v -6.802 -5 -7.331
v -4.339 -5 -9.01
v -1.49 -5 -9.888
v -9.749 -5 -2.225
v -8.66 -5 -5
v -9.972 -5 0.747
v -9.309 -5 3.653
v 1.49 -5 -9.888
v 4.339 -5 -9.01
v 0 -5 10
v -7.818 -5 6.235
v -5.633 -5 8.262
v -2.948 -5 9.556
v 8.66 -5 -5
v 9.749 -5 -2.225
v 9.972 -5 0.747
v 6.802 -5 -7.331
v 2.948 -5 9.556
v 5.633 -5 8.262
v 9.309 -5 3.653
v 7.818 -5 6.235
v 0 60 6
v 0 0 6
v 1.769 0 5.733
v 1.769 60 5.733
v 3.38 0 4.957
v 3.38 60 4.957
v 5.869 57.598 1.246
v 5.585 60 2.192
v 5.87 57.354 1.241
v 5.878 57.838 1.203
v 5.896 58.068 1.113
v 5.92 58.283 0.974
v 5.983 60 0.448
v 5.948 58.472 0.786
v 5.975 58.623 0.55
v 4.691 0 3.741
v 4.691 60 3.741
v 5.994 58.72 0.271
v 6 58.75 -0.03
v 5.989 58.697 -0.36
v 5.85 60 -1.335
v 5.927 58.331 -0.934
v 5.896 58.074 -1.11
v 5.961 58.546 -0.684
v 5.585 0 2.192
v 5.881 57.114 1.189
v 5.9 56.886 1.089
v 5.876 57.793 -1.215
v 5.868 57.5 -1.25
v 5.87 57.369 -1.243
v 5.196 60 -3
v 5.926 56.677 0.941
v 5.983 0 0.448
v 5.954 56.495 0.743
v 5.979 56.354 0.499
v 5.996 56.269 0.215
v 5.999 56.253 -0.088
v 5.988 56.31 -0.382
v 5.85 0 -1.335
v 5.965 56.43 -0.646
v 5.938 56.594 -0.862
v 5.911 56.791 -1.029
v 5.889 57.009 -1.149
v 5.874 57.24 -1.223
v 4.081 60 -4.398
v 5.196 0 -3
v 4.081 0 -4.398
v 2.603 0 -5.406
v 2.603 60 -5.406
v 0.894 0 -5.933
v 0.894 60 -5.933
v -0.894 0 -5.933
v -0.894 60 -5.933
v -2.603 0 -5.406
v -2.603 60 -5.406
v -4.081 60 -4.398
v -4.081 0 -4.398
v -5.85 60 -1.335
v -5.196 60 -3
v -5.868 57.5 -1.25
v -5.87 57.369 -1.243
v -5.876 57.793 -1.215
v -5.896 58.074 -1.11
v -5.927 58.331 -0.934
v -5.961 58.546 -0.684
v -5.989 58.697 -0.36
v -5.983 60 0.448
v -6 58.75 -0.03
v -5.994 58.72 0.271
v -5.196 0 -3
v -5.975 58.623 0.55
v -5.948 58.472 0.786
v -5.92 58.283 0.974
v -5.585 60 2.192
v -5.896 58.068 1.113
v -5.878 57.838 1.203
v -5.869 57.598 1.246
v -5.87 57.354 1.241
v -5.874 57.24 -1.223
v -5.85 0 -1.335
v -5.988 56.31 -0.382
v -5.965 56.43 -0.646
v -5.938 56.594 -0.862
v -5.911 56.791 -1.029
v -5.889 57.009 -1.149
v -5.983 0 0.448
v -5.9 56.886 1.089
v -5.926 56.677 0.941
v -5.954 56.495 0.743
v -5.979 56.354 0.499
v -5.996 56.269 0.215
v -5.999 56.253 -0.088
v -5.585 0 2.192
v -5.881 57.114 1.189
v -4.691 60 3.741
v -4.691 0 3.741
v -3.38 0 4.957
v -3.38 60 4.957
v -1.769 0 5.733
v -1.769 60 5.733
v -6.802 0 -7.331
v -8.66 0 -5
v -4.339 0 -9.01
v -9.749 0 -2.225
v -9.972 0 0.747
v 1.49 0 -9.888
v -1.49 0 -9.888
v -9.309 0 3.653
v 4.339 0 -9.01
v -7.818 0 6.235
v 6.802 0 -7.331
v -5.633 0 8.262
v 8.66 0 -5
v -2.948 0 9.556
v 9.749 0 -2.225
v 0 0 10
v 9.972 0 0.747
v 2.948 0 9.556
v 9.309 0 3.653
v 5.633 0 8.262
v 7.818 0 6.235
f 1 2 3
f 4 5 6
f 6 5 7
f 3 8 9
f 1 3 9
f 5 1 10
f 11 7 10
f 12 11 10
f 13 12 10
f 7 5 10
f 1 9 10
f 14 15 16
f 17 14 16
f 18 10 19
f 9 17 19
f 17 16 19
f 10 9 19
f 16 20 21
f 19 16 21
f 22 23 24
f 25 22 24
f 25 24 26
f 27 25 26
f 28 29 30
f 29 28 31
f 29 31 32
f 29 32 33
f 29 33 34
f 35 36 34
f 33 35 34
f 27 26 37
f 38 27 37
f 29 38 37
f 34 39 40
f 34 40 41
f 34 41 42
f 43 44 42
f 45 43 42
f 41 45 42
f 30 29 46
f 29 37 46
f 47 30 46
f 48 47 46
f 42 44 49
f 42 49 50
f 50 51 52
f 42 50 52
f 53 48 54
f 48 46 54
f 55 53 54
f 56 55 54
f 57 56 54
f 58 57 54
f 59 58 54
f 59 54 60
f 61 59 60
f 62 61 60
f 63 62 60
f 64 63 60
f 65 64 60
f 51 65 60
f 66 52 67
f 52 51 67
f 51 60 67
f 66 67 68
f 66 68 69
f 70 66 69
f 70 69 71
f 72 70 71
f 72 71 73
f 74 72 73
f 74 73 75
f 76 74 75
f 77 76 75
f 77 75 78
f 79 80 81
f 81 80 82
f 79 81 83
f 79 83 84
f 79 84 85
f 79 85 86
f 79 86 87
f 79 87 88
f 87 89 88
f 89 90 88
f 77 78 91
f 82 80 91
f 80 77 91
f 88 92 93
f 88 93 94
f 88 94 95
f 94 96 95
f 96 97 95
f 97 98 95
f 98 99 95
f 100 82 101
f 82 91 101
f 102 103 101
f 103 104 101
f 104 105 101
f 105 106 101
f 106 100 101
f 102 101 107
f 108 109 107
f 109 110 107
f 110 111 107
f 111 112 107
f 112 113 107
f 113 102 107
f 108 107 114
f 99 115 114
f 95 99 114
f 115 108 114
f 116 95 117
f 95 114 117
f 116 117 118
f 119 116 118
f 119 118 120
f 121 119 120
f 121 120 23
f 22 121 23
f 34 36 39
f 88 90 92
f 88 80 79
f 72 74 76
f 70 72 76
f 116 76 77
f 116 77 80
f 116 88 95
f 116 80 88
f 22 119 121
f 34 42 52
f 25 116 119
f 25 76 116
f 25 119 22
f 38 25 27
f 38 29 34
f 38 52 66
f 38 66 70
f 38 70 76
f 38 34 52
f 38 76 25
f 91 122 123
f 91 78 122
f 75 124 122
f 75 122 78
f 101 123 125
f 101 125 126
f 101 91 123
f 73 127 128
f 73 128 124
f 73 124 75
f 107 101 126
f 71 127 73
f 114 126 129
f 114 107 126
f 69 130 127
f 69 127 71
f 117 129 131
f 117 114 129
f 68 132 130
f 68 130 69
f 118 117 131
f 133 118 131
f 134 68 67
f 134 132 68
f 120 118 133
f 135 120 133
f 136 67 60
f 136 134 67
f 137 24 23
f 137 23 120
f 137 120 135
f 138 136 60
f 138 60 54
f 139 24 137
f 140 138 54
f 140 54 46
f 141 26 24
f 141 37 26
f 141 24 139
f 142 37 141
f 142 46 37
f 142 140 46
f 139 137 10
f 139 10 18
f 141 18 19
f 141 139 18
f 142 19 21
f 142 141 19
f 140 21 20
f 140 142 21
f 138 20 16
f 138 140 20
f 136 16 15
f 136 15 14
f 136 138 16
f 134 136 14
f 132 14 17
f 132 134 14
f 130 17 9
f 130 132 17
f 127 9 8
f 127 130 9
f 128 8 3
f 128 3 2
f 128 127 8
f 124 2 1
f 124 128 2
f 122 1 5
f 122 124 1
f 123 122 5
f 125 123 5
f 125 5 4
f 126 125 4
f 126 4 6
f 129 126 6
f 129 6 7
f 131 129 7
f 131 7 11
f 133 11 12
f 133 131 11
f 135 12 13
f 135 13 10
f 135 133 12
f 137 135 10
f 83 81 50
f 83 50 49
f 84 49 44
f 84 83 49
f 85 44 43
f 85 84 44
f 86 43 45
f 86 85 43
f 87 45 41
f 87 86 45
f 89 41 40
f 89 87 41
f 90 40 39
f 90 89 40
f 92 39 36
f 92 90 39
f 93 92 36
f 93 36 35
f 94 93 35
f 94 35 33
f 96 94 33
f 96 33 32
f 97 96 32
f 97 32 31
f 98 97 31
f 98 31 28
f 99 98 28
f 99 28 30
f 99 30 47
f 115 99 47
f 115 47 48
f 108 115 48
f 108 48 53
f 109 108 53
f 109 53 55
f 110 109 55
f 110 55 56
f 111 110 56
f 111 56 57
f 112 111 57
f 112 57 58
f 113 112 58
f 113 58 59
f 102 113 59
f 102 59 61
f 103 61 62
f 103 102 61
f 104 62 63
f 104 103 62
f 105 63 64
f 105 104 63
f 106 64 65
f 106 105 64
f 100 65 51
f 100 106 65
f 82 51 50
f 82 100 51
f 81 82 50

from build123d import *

# Parameters (mm, degrees)
SKETCH1_R               = 6
BOSS_EXTRUDE1_DEPTH     = 60
SKETCH1_3_R             = 10
BOSS_EXTRUDE2_DEPTH     = 5
CUT_EXTRUDE1_DEPTH      = 62.64414003
CUT_EXTRUDE1_DEPTH_BACK = 62.64414003
SKETCH2_R               = 1.25


with BuildPart() as part:
    # Sketch1 → Boss-Extrude1 (new body)
    with BuildSketch(Plane(origin=(0, 0, 0), x_dir=(1, 0, 0), z_dir=(0, 1, 0))):
        Circle(SKETCH1_R)
    extrude(amount=BOSS_EXTRUDE1_DEPTH)

    # Sketch1<3> → Boss-Extrude2 (add)
    with BuildSketch(Plane(origin=(0, 0, 0), x_dir=(1, 0, 0), z_dir=(0, 1, 0))):
        Circle(SKETCH1_3_R)
    extrude(amount=-BOSS_EXTRUDE2_DEPTH)

    # Sketch2 → Cut-Extrude1 (cut, two sides: drawn at the far end of the back side and taken through both)
    with BuildSketch(Plane(origin=(0, 0, 0), x_dir=(0, 0, -1), z_dir=(1, 0, 0)).offset(-CUT_EXTRUDE1_DEPTH_BACK)):
        with Locations((0, 57.5)):
            Circle(SKETCH2_R)
    extrude(amount=CUT_EXTRUDE1_DEPTH + CUT_EXTRUDE1_DEPTH_BACK, mode=Mode.SUBTRACT)


solid = part.part
